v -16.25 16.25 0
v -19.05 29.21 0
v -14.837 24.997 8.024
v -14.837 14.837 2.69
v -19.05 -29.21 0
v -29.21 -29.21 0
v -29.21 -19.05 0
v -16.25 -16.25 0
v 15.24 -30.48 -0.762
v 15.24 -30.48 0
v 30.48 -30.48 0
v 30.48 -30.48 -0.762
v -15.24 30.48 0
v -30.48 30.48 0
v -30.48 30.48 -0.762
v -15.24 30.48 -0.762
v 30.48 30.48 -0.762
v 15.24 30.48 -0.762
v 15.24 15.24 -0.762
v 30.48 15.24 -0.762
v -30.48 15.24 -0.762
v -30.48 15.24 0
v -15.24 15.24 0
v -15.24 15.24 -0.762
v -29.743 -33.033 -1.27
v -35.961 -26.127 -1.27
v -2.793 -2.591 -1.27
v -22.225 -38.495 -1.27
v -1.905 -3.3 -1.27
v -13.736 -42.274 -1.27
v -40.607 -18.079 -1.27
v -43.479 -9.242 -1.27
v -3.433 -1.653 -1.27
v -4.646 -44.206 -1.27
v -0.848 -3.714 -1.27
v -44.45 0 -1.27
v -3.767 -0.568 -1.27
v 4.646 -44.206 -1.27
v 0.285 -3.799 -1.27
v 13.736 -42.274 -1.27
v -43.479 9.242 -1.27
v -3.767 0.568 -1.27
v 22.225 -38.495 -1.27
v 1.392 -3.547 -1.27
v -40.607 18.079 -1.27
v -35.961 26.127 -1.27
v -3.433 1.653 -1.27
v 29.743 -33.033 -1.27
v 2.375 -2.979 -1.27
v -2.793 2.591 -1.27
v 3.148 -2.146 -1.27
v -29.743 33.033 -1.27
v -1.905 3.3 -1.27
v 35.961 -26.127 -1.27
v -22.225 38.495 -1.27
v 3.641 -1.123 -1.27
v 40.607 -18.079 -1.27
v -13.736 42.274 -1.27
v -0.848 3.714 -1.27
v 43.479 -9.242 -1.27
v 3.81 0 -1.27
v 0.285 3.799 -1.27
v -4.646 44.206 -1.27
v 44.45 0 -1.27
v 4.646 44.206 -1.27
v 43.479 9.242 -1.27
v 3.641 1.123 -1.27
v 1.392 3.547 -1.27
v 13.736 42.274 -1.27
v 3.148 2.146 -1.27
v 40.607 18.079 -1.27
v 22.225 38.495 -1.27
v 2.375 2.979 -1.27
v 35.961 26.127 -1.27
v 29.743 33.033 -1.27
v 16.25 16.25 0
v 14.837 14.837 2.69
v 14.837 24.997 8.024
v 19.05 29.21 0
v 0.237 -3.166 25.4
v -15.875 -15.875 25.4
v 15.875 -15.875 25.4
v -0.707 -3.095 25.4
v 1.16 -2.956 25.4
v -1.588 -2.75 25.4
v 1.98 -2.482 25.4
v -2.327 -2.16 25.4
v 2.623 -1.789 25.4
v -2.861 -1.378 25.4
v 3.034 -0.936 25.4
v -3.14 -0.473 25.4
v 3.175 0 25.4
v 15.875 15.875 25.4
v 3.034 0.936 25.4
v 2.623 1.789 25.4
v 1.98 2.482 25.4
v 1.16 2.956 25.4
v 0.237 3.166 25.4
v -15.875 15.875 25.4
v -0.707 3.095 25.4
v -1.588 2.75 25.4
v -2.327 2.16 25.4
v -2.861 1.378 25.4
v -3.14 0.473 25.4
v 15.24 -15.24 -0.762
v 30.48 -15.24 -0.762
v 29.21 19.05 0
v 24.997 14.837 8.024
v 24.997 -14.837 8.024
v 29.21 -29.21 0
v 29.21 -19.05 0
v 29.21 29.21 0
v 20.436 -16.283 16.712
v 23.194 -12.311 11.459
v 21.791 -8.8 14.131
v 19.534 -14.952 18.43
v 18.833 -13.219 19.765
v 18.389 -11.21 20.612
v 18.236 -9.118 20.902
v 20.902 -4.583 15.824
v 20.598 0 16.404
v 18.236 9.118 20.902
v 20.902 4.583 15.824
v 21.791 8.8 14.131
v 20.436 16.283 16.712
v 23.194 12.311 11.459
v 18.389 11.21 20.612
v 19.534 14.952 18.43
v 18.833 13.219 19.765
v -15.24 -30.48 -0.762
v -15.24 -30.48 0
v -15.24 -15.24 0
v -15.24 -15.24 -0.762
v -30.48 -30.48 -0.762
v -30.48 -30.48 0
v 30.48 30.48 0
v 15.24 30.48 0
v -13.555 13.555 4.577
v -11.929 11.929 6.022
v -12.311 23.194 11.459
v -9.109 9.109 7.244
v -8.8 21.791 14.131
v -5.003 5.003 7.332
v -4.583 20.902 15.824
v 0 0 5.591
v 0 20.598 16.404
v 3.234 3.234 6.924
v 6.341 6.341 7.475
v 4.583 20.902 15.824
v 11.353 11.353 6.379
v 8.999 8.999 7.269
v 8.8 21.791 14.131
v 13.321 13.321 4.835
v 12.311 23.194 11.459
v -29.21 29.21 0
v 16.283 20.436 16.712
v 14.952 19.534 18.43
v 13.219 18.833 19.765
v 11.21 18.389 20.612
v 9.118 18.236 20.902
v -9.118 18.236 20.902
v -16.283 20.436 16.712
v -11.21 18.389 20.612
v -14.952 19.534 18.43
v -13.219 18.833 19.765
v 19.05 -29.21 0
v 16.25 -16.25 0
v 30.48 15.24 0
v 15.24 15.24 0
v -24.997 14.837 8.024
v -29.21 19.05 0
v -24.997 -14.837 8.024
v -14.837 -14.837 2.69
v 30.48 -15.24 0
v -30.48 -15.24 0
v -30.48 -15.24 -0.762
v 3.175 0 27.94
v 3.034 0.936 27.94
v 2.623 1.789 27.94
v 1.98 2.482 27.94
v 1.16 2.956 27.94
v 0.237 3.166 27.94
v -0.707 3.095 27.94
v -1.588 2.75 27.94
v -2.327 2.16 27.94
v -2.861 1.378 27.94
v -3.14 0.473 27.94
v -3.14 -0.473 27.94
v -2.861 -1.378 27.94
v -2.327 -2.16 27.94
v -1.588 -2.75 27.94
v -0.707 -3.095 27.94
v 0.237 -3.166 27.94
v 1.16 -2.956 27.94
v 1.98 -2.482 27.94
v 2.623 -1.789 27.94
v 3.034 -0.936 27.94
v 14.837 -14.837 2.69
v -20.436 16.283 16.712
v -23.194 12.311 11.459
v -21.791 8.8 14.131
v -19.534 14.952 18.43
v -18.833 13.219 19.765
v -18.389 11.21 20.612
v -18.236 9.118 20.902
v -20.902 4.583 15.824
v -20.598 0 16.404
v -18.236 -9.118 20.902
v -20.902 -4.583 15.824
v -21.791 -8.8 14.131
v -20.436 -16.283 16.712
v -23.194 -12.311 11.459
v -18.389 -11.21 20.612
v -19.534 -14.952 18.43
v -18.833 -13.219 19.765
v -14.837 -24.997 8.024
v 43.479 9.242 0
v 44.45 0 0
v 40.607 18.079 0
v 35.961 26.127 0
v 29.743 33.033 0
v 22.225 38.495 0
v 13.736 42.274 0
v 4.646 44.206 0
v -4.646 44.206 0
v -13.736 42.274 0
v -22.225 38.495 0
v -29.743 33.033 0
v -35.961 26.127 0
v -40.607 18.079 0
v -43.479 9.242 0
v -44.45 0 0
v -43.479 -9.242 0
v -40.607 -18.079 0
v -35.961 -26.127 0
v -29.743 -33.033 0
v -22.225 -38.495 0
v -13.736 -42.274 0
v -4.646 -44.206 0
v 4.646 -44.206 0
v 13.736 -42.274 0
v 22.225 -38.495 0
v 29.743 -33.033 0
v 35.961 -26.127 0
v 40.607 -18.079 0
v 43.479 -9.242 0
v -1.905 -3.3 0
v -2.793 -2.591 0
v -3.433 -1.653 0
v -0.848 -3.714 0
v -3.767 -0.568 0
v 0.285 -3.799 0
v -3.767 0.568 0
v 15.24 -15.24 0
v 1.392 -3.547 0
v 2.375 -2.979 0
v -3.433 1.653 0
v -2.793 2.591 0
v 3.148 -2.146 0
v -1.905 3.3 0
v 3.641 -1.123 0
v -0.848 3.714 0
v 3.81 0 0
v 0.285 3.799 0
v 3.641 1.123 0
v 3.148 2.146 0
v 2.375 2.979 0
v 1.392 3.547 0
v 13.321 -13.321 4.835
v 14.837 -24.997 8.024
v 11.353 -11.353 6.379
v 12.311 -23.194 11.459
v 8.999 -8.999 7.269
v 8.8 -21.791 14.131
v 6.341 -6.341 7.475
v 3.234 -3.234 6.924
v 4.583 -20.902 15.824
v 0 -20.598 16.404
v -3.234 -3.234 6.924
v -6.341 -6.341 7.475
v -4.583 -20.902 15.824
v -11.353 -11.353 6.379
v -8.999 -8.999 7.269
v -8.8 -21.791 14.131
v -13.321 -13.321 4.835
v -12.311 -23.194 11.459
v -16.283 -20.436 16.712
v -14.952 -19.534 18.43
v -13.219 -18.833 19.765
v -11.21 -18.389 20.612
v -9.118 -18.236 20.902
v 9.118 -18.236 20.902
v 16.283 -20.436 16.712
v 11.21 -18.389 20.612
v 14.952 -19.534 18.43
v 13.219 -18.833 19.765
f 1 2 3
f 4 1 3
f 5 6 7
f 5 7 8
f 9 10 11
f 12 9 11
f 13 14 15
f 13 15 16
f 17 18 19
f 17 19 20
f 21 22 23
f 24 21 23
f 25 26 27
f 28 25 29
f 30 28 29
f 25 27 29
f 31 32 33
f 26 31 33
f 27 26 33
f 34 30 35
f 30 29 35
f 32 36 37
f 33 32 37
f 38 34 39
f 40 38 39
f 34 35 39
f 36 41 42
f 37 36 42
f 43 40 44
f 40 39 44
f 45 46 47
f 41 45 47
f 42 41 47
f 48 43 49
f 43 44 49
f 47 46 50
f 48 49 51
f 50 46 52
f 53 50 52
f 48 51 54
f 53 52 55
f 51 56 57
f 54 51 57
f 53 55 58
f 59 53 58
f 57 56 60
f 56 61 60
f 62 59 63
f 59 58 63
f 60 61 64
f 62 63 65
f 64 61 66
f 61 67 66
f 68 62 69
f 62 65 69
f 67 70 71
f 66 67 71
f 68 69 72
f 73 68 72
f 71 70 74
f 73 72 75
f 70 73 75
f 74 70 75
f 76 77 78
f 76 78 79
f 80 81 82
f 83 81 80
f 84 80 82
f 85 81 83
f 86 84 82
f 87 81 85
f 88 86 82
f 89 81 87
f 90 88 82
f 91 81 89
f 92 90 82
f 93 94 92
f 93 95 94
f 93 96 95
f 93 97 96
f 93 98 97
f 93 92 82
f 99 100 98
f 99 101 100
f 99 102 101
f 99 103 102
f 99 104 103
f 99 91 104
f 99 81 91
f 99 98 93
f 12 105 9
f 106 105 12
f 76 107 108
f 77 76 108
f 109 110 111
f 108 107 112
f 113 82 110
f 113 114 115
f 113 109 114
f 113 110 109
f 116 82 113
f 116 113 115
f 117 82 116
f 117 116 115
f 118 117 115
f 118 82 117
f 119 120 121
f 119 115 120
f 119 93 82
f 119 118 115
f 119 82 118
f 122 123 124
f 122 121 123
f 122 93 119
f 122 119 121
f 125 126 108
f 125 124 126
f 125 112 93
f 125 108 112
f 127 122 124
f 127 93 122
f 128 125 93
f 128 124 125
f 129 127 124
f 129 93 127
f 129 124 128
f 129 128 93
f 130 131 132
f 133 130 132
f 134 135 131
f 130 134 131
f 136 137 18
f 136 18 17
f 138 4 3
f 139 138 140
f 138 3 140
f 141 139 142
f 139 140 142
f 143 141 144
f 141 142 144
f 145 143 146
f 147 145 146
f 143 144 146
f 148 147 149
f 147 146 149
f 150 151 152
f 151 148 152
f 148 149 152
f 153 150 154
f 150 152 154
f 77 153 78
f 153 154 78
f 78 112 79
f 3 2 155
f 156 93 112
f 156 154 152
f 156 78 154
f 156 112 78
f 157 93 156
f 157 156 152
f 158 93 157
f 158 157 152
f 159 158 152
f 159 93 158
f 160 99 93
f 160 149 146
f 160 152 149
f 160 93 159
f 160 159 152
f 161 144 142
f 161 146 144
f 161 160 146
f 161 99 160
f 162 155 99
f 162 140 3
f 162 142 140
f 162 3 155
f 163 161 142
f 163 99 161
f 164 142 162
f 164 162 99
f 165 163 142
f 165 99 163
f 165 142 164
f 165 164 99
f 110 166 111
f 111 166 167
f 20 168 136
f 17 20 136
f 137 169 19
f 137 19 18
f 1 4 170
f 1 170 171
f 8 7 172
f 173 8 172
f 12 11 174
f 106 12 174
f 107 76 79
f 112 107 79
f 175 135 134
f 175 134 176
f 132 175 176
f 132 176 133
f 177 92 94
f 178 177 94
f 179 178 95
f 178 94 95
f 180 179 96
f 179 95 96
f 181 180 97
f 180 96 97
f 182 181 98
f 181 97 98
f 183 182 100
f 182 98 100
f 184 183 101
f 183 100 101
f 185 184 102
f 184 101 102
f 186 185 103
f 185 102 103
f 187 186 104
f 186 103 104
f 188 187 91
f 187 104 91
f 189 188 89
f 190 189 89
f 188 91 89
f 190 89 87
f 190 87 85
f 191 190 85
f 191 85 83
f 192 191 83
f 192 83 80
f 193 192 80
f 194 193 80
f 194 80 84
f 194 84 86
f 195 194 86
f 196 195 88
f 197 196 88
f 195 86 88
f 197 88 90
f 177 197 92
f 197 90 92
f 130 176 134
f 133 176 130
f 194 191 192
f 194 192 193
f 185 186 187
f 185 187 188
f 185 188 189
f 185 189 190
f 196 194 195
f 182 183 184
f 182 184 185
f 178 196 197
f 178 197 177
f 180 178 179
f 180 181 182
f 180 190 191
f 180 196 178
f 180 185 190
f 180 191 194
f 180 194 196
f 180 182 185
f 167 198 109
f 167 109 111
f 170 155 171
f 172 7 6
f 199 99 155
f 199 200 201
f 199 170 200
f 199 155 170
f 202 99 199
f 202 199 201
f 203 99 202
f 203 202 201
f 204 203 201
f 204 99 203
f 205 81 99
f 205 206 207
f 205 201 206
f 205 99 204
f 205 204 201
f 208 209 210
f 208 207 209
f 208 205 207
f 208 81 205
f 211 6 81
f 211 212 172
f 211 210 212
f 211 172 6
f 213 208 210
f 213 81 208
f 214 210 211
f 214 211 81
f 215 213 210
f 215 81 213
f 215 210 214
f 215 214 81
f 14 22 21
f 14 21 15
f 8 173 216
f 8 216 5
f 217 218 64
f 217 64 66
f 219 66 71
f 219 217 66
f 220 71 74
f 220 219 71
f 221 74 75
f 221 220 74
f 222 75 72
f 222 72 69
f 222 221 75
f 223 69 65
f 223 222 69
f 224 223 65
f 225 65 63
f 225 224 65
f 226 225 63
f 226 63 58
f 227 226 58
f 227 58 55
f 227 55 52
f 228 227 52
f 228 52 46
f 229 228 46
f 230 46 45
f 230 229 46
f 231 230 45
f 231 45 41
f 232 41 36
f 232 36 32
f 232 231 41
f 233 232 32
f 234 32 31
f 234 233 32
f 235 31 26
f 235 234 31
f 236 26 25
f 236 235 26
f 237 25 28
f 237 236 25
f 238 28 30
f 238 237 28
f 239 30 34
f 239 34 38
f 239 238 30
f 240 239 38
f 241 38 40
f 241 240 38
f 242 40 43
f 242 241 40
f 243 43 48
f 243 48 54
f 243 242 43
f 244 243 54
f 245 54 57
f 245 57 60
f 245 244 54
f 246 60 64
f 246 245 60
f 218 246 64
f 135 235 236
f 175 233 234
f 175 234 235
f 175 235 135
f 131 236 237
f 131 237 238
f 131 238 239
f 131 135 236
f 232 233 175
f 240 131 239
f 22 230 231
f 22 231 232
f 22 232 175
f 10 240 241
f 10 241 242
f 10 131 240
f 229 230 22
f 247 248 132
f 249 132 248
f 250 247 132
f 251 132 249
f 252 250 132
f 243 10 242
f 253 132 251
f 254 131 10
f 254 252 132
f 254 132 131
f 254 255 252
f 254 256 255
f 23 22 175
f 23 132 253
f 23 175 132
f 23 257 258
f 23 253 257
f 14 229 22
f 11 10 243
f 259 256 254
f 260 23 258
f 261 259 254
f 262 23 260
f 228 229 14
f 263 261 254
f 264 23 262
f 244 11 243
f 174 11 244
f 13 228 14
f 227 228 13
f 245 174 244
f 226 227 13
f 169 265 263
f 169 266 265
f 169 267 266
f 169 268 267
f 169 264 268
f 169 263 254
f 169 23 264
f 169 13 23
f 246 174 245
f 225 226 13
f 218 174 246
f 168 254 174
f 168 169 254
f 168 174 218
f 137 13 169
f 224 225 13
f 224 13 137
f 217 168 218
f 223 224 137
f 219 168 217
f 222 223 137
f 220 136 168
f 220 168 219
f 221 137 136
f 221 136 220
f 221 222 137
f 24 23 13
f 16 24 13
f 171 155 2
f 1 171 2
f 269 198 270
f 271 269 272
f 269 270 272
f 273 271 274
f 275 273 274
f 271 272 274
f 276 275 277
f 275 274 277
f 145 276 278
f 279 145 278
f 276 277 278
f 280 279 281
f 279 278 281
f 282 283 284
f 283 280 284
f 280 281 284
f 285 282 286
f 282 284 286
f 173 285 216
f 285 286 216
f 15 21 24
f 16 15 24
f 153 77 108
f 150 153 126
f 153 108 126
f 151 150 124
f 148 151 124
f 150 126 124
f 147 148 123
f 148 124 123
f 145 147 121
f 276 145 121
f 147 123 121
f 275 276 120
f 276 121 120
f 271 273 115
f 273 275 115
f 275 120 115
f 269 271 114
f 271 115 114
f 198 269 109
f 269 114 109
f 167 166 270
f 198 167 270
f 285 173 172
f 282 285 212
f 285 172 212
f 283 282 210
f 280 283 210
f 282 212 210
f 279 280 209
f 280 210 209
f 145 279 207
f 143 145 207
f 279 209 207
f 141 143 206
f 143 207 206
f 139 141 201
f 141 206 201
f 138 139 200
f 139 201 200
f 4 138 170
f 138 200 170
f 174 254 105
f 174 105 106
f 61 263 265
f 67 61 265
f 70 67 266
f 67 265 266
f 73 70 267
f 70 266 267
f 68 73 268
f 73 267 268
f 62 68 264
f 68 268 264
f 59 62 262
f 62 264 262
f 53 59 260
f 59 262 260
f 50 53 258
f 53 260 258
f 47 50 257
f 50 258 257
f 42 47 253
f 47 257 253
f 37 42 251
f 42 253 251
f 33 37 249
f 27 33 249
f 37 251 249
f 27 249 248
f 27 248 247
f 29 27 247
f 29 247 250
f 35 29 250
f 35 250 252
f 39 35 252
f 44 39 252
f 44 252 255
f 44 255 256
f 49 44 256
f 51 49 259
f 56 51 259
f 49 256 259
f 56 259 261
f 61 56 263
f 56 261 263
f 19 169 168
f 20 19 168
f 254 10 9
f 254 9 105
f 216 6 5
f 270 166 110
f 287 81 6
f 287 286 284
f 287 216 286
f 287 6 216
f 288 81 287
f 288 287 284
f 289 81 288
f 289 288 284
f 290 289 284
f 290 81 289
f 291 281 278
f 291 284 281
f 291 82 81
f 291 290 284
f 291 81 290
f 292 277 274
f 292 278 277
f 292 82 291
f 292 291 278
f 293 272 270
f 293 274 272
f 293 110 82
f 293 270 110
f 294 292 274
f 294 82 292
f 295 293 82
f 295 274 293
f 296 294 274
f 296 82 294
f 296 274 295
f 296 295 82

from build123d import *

# Parameters (mm, degrees)
F0_R      = 44.45
F0_R_2    = 3.81
F1_DEPTH  = 1.27
F2_W      = 58.42
F2_H      = 58.42
F4_W      = 31.75
F4_H      = 31.75
F10_DEPTH = 141.478
F11_DEPTH = 70.866
F12_DEPTH = 64.516
F13_DEPTH = 65.278
F14_W     = 15.24
F14_H     = 15.24
F15_DEPTH = 0.762
F16_R     = 3.175
F17_DEPTH = 2.54


with BuildPart() as f1:
    # F0 (on Top) → F1 (new body)
    with BuildSketch(Plane.XY):
        Circle(F0_R)
        Circle(F0_R_2, mode=Mode.SUBTRACT)
    extrude(amount=-F1_DEPTH)

    # F14 (on face) → F15 (cut)
    with BuildSketch(Plane.XY):
        with Locations((-22.86, 22.86)):
            Rectangle(F14_W, F14_H)
        with Locations((22.86, 22.86)):
            Rectangle(F14_W, F14_H)
        with Locations((22.86, -22.86)):
            Rectangle(F14_W, F14_H)
        with Locations((-22.86, -22.86)):
            Rectangle(F14_W, F14_H)
    extrude(amount=-F15_DEPTH, mode=Mode.SUBTRACT)


with BuildPart() as f5:
    # F2 (on Top) → F5 section 0
    with BuildSketch(Plane.XY):
        Rectangle(F2_W, F2_H)
    # F4 (on offset) → F5 section 1
    with BuildSketch(Plane.XY.offset(25.4)):
        Rectangle(F4_W, F4_H)
    loft()

    # F7 (on face) → F10 (cut)
    with BuildSketch(Plane(origin=(-22.8985791279, 0, 12.0217540421), x_dir=(0, -1, 0), z_dir=(-0.8853979028, 0, 0.464833899))):
        with BuildLine():
            Line((-19.05, -13.5777981895), (19.05, -13.5777981895))
            Line((19.05, -13.5777981895), (14.8374191851, -4.5152474072))
            ThreePointArc((14.8374191851, -4.5152474072), (0, 4.9498685856), (-14.8374191851, -4.5152474072))
            Line((-14.8374191851, -4.5152474072), (-19.05, -13.5777981895))
        make_face()
    extrude(amount=-F10_DEPTH, mode=Mode.SUBTRACT)

    # F8 (on face) → F11 (cut)
    with BuildSketch(Plane(origin=(0, -22.8985791279, 12.0217540421), x_dir=(1, 0, 0), z_dir=(0, -0.8853979028, 0.464833899))):
        with BuildLine():
            Line((-14.8374191851, -4.5152474072), (-19.05, -13.5777981895))
            Line((-19.05, -13.5777981895), (19.05, -13.5777981895))
            Line((19.05, -13.5777981895), (14.8374191851, -4.5152474072))
            ThreePointArc((14.8374191851, -4.5152474072), (0, 4.9498685856), (-14.8374191851, -4.5152474072))
        make_face()
    extrude(amount=-F11_DEPTH, mode=Mode.SUBTRACT)

    # F9 (on face) → F12 (cut)
    with BuildSketch(Plane(origin=(22.8985791279, 0, 12.0217540421), x_dir=(0, 1, 0), z_dir=(0.8853979028, 0, 0.464833899))):
        with BuildLine():
            Line((-19.05, -13.5777981895), (19.05, -13.5777981895))
            Line((19.05, -13.5777981895), (14.8374191851, -4.5152474072))
            ThreePointArc((14.8374191851, -4.5152474072), (0, 4.9498685856), (-14.8374191851, -4.5152474072))
            Line((-14.8374191851, -4.5152474072), (-19.05, -13.5777981895))
        make_face()
    extrude(amount=-F12_DEPTH, mode=Mode.SUBTRACT)

    # F6 (on face) → F13 (cut)
    with BuildSketch(Plane(origin=(0, 22.8985791279, 12.0217540421), x_dir=(-1, 0, 0), z_dir=(0, 0.8853979028, 0.464833899))):
        with BuildLine():
            Line((-19.05, -13.5777981895), (19.05, -13.5777981895))
            Line((19.05, -13.5777981895), (14.8374191851, -4.5152474072))
            ThreePointArc((14.8374191851, -4.5152474072), (0, 4.9498685856), (-14.8374191851, -4.5152474072))
            Line((-14.8374191851, -4.5152474072), (-19.05, -13.5777981895))
        make_face()
    extrude(amount=-F13_DEPTH, mode=Mode.SUBTRACT)

    # F16 (on face) → F17 (join)
    with BuildSketch(Plane.XY.offset(25.4)):
        Circle(F16_R)
    extrude(amount=F17_DEPTH)


solid = Compound([f1.part, f5.part])
